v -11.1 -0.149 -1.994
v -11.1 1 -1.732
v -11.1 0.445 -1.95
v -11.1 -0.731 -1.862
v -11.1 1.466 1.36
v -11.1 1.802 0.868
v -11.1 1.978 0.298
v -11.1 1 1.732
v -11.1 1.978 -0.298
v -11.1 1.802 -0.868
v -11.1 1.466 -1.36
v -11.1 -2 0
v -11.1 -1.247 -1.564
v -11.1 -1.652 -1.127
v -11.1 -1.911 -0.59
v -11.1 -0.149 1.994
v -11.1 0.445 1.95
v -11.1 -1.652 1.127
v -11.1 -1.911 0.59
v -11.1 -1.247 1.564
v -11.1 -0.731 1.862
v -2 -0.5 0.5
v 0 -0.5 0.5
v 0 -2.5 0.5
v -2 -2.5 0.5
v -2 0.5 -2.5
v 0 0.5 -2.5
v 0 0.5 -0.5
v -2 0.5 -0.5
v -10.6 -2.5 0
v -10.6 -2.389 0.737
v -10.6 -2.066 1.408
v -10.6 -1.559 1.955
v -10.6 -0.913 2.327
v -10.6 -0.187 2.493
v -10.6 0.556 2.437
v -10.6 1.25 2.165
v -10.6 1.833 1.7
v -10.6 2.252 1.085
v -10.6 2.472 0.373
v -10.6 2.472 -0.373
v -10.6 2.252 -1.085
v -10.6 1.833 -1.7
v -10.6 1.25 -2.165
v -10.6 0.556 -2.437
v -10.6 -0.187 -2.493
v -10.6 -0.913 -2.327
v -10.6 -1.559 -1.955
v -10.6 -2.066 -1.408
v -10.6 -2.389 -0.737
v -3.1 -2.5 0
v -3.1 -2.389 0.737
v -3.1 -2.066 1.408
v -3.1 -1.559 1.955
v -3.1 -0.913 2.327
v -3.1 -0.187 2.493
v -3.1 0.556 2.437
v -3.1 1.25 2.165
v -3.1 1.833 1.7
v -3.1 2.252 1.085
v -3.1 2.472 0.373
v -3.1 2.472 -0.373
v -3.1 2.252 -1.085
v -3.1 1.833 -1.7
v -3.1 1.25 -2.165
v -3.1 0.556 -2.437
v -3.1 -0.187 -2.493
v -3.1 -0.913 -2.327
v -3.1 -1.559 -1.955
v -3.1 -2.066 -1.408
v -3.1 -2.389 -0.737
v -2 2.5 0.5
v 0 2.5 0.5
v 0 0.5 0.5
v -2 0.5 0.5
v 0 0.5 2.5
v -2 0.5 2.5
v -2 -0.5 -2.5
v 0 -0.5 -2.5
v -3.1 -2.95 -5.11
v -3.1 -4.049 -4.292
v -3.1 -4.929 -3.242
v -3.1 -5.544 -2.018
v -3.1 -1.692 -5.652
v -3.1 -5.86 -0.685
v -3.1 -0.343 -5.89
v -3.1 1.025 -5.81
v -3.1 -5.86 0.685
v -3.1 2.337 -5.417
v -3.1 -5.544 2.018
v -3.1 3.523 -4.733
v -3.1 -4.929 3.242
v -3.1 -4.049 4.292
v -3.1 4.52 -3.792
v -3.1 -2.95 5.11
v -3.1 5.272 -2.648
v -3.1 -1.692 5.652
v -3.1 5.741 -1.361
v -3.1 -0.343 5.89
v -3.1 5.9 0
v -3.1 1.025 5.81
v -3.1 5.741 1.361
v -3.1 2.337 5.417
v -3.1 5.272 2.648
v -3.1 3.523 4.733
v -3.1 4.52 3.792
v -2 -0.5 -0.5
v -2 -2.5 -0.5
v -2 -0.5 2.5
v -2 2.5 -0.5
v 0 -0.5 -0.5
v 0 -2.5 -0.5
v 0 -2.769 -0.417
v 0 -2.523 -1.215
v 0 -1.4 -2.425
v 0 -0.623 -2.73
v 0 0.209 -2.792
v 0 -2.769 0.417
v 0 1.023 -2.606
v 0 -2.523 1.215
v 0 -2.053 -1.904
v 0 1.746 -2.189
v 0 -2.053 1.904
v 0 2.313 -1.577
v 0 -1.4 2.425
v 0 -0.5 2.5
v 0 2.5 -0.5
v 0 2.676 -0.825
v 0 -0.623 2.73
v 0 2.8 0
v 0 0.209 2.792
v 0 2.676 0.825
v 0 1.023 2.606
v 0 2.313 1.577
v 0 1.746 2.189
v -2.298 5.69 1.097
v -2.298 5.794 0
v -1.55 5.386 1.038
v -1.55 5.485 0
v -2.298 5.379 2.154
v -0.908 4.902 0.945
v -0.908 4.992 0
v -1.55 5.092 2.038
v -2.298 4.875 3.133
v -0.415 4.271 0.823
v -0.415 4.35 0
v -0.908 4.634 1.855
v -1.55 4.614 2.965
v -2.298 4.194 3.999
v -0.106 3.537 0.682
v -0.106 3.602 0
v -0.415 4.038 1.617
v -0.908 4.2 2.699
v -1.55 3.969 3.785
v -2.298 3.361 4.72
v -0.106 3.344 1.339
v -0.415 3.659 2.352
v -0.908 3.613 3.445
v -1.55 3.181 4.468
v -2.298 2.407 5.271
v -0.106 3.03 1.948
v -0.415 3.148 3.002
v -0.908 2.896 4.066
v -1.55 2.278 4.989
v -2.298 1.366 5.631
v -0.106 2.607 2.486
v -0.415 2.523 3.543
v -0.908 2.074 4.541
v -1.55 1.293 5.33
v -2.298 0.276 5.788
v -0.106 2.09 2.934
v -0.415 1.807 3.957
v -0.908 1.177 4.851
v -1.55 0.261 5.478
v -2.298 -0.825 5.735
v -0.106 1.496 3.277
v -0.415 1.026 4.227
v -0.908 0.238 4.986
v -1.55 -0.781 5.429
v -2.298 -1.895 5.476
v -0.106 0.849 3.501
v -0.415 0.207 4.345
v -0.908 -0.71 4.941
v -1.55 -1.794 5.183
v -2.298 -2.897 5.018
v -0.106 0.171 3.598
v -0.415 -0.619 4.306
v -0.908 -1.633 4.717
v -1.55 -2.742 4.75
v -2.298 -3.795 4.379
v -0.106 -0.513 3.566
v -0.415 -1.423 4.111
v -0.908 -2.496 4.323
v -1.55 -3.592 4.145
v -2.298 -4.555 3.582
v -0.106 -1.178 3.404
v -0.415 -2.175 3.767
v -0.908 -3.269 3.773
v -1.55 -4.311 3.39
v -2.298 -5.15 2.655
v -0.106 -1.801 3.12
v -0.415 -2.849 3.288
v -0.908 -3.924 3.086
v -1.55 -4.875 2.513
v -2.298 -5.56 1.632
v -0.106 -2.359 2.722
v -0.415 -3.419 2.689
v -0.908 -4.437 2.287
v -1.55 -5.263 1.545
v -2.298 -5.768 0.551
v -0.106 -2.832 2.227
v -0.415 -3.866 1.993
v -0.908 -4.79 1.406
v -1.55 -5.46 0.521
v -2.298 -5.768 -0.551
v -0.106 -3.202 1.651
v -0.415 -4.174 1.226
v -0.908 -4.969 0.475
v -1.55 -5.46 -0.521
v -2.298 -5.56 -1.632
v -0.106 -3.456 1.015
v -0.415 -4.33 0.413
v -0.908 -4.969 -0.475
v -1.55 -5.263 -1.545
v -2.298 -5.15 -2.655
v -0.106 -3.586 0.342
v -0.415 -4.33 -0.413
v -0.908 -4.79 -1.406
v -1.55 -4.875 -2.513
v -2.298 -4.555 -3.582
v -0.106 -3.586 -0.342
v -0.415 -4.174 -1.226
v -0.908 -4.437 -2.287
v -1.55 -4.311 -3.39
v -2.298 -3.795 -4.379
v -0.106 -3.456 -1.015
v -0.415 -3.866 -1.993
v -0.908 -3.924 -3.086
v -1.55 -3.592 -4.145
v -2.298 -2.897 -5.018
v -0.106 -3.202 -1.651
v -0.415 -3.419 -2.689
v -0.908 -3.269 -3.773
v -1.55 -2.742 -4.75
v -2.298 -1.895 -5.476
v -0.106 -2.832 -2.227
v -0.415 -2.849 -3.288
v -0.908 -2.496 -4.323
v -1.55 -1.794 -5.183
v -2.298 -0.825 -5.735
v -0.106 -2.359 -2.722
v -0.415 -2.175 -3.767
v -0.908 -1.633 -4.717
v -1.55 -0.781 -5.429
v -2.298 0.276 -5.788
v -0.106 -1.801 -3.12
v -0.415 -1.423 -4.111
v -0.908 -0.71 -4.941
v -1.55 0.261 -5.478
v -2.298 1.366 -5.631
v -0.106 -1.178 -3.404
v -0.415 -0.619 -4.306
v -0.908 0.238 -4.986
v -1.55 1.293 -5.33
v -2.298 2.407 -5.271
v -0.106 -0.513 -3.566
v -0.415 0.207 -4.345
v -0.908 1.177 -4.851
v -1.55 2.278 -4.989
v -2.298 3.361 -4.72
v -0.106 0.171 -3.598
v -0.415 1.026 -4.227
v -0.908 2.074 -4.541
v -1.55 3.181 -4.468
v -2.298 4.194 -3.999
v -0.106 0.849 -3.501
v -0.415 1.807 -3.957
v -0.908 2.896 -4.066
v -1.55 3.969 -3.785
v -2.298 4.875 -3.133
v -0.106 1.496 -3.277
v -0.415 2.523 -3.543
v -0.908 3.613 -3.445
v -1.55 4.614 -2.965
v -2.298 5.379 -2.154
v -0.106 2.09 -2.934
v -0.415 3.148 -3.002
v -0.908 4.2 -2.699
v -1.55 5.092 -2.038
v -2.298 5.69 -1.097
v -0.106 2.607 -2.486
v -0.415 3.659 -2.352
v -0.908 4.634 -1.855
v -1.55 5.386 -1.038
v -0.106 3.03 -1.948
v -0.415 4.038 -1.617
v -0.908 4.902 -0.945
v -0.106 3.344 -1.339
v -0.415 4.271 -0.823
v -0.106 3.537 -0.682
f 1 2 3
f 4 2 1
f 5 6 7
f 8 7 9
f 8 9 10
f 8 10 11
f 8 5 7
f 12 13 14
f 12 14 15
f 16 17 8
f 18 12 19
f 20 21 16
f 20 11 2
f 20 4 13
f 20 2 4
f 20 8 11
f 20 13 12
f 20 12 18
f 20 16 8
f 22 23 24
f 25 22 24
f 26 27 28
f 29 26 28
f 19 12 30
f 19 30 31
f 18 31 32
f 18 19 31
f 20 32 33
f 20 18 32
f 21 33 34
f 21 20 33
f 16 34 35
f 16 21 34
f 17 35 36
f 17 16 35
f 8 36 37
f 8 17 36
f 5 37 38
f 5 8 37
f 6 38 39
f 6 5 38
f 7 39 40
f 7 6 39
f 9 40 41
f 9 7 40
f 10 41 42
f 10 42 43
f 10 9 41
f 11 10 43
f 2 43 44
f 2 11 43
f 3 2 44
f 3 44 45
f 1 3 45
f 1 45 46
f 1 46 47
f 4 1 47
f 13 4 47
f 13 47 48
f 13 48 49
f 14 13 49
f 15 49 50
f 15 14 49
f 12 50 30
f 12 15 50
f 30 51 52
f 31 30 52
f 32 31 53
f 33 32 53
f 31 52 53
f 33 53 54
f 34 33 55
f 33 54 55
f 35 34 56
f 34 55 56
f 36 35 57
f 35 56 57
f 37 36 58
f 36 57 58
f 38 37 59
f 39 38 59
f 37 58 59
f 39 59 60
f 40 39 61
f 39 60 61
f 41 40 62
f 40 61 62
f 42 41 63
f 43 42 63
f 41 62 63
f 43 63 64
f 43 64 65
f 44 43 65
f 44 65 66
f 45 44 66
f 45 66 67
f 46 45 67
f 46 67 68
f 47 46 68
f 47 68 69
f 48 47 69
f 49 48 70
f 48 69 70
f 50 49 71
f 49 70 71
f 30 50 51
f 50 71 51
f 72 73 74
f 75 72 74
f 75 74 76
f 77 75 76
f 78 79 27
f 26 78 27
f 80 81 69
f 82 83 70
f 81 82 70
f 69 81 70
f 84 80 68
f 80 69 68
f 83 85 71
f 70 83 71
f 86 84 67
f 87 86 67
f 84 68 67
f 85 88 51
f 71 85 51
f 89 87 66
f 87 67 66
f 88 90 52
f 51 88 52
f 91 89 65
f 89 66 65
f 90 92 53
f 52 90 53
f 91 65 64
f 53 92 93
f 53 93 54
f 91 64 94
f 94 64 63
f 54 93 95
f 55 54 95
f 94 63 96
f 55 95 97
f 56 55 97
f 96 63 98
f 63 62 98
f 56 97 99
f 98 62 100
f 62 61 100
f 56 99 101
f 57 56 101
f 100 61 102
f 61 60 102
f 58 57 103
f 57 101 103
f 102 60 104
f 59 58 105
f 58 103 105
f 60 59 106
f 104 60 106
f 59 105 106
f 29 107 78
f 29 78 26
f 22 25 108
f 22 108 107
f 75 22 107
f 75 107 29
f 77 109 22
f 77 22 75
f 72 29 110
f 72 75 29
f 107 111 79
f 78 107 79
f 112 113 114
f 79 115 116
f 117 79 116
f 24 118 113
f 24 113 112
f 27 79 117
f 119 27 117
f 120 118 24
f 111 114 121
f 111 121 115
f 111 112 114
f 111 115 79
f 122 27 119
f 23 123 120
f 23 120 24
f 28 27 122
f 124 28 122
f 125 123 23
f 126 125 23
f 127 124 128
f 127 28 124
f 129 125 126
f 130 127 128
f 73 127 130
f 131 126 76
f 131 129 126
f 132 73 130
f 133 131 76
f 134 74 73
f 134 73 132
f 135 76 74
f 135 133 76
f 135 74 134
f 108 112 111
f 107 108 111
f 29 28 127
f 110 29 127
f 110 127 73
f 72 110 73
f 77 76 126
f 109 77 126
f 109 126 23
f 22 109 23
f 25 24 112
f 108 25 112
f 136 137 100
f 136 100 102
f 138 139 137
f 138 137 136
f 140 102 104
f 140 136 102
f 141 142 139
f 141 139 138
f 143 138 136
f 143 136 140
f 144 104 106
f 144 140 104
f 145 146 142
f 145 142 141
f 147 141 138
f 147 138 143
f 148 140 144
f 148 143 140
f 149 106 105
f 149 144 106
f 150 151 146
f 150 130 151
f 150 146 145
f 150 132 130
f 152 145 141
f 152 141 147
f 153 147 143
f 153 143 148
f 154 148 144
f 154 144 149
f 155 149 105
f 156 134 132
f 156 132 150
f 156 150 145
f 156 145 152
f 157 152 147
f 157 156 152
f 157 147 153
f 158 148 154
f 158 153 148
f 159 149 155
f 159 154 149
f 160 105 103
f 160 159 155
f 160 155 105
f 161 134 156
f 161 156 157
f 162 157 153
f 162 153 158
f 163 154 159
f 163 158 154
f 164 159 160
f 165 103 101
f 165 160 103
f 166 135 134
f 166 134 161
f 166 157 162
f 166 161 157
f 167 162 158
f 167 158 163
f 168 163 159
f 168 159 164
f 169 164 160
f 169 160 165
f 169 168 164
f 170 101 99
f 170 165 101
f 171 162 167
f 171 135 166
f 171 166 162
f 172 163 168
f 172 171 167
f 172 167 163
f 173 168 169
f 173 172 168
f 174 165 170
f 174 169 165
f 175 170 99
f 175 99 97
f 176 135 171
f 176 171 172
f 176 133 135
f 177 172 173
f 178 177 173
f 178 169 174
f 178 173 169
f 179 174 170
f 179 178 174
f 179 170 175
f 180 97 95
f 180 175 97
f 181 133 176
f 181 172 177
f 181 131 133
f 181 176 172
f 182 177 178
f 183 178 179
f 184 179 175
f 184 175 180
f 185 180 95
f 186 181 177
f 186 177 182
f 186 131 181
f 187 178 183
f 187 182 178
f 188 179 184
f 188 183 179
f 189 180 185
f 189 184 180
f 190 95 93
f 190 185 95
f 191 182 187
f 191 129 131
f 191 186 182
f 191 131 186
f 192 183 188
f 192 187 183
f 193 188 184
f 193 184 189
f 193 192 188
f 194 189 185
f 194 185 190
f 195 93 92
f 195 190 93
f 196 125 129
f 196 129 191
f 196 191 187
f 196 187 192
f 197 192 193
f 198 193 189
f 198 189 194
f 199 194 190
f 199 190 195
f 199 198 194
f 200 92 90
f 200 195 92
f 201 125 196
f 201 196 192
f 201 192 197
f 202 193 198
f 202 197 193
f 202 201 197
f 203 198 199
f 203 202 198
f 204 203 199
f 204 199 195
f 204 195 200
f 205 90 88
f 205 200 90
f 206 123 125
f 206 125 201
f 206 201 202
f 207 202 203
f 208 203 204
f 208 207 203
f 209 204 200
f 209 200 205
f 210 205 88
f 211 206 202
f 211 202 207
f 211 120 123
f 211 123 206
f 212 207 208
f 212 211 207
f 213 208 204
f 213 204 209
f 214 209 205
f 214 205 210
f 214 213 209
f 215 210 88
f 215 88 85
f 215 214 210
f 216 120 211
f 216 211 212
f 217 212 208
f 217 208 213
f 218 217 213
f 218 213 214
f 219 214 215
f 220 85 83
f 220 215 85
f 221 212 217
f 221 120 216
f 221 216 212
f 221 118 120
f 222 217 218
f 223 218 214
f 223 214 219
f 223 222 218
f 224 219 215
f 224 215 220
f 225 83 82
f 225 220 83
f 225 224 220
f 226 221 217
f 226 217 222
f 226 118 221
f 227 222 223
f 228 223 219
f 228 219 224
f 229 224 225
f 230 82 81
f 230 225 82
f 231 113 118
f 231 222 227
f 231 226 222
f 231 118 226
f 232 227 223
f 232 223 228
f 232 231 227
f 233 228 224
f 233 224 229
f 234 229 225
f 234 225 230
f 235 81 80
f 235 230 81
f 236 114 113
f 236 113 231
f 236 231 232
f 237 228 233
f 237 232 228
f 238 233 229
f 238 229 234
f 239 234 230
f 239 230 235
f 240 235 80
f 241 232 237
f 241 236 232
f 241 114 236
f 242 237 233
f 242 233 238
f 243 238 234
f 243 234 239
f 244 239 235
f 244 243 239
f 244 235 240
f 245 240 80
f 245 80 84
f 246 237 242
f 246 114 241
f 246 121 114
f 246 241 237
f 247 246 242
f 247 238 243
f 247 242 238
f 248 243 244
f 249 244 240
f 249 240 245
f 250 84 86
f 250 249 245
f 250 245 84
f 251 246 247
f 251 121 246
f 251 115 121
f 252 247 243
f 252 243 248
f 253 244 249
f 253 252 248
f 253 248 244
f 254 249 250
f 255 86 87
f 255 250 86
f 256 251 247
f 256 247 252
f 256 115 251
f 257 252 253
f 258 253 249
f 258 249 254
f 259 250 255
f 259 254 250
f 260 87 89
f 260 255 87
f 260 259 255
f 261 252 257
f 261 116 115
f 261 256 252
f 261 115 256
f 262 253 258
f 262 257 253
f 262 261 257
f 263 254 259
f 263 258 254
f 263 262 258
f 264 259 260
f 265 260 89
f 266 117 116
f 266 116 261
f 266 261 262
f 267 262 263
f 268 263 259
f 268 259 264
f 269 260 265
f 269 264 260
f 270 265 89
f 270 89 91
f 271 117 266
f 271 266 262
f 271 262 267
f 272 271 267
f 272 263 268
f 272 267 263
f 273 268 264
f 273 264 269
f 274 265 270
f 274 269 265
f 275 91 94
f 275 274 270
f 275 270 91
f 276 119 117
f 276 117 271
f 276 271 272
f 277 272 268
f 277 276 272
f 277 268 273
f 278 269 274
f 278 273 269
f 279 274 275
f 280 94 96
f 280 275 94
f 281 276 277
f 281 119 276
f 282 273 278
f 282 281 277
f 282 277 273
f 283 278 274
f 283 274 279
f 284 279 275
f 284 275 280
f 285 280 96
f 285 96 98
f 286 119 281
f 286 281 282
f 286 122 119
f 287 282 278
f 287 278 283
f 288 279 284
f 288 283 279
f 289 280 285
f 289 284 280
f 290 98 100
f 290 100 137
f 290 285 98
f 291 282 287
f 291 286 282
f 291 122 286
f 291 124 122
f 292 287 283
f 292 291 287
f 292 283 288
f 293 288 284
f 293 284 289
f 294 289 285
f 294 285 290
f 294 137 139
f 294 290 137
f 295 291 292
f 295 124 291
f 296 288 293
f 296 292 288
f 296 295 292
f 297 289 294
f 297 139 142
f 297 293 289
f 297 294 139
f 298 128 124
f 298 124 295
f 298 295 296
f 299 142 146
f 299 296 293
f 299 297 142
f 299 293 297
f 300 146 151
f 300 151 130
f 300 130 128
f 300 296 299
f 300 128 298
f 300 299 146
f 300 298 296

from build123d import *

# Parameters (mm, degrees)
F0_R     = 5.9
F1_DEPTH = 3.1
F2_R     = 3.09999
F4_DEPTH = 2
F5_R     = 2.5
F6_DEPTH = 8
F7_SIZE  = 0.5


# Not quite as in the source:
# - a fillet or chamfer is up to 0.001 mm smaller than in the source, because OpenCascade refuses the exact size


with BuildPart() as f1:
    # F0 (on Right) → F1 (new body)
    with BuildSketch(Plane.YZ):
        Circle(F0_R)
    extrude(amount=-F1_DEPTH)

    # F2 (radius 3.1 in the source; OpenCascade refuses exactly that, so slightly less here)
    f2_edges = [f1.edges().sort_by_distance(p)[0] for p in [
        (0, -5.9, 0),
    ]]
    fillet(f2_edges, radius=F2_R)

    # F3 (on face) → F4 (cut)
    with BuildSketch(Plane.YZ):
        Polygon((0.5, 2.5), (0, 2.5), (-0.5, 2.5), (-0.5, 0.5), (-2.5, 0.5), (-2.5, 0), (-2.5, -0.5), (-0.5, -0.5), (-0.5, -2.5), (0, -2.5), (0.5, -2.5), (0.5, -0.5), (2.5, -0.5), (2.5, 0), (2.5, 0.5), (0.5, 0.5), align=None)
    extrude(amount=-F4_DEPTH, mode=Mode.SUBTRACT)

    # F5 (on face) → F6 (join)
    with BuildSketch(Plane(origin=(-3.1, 0, 0), x_dir=(0, -1, 0), z_dir=(-1, 0, 0))):
        Circle(F5_R)
    extrude(amount=F6_DEPTH)

    # F7
    f7_edges = [f1.edges().sort_by_distance(p)[0] for p in [
        (-11.1, 2.5, 0),
    ]]
    chamfer(f7_edges, length=F7_SIZE)


solid = f1.part
